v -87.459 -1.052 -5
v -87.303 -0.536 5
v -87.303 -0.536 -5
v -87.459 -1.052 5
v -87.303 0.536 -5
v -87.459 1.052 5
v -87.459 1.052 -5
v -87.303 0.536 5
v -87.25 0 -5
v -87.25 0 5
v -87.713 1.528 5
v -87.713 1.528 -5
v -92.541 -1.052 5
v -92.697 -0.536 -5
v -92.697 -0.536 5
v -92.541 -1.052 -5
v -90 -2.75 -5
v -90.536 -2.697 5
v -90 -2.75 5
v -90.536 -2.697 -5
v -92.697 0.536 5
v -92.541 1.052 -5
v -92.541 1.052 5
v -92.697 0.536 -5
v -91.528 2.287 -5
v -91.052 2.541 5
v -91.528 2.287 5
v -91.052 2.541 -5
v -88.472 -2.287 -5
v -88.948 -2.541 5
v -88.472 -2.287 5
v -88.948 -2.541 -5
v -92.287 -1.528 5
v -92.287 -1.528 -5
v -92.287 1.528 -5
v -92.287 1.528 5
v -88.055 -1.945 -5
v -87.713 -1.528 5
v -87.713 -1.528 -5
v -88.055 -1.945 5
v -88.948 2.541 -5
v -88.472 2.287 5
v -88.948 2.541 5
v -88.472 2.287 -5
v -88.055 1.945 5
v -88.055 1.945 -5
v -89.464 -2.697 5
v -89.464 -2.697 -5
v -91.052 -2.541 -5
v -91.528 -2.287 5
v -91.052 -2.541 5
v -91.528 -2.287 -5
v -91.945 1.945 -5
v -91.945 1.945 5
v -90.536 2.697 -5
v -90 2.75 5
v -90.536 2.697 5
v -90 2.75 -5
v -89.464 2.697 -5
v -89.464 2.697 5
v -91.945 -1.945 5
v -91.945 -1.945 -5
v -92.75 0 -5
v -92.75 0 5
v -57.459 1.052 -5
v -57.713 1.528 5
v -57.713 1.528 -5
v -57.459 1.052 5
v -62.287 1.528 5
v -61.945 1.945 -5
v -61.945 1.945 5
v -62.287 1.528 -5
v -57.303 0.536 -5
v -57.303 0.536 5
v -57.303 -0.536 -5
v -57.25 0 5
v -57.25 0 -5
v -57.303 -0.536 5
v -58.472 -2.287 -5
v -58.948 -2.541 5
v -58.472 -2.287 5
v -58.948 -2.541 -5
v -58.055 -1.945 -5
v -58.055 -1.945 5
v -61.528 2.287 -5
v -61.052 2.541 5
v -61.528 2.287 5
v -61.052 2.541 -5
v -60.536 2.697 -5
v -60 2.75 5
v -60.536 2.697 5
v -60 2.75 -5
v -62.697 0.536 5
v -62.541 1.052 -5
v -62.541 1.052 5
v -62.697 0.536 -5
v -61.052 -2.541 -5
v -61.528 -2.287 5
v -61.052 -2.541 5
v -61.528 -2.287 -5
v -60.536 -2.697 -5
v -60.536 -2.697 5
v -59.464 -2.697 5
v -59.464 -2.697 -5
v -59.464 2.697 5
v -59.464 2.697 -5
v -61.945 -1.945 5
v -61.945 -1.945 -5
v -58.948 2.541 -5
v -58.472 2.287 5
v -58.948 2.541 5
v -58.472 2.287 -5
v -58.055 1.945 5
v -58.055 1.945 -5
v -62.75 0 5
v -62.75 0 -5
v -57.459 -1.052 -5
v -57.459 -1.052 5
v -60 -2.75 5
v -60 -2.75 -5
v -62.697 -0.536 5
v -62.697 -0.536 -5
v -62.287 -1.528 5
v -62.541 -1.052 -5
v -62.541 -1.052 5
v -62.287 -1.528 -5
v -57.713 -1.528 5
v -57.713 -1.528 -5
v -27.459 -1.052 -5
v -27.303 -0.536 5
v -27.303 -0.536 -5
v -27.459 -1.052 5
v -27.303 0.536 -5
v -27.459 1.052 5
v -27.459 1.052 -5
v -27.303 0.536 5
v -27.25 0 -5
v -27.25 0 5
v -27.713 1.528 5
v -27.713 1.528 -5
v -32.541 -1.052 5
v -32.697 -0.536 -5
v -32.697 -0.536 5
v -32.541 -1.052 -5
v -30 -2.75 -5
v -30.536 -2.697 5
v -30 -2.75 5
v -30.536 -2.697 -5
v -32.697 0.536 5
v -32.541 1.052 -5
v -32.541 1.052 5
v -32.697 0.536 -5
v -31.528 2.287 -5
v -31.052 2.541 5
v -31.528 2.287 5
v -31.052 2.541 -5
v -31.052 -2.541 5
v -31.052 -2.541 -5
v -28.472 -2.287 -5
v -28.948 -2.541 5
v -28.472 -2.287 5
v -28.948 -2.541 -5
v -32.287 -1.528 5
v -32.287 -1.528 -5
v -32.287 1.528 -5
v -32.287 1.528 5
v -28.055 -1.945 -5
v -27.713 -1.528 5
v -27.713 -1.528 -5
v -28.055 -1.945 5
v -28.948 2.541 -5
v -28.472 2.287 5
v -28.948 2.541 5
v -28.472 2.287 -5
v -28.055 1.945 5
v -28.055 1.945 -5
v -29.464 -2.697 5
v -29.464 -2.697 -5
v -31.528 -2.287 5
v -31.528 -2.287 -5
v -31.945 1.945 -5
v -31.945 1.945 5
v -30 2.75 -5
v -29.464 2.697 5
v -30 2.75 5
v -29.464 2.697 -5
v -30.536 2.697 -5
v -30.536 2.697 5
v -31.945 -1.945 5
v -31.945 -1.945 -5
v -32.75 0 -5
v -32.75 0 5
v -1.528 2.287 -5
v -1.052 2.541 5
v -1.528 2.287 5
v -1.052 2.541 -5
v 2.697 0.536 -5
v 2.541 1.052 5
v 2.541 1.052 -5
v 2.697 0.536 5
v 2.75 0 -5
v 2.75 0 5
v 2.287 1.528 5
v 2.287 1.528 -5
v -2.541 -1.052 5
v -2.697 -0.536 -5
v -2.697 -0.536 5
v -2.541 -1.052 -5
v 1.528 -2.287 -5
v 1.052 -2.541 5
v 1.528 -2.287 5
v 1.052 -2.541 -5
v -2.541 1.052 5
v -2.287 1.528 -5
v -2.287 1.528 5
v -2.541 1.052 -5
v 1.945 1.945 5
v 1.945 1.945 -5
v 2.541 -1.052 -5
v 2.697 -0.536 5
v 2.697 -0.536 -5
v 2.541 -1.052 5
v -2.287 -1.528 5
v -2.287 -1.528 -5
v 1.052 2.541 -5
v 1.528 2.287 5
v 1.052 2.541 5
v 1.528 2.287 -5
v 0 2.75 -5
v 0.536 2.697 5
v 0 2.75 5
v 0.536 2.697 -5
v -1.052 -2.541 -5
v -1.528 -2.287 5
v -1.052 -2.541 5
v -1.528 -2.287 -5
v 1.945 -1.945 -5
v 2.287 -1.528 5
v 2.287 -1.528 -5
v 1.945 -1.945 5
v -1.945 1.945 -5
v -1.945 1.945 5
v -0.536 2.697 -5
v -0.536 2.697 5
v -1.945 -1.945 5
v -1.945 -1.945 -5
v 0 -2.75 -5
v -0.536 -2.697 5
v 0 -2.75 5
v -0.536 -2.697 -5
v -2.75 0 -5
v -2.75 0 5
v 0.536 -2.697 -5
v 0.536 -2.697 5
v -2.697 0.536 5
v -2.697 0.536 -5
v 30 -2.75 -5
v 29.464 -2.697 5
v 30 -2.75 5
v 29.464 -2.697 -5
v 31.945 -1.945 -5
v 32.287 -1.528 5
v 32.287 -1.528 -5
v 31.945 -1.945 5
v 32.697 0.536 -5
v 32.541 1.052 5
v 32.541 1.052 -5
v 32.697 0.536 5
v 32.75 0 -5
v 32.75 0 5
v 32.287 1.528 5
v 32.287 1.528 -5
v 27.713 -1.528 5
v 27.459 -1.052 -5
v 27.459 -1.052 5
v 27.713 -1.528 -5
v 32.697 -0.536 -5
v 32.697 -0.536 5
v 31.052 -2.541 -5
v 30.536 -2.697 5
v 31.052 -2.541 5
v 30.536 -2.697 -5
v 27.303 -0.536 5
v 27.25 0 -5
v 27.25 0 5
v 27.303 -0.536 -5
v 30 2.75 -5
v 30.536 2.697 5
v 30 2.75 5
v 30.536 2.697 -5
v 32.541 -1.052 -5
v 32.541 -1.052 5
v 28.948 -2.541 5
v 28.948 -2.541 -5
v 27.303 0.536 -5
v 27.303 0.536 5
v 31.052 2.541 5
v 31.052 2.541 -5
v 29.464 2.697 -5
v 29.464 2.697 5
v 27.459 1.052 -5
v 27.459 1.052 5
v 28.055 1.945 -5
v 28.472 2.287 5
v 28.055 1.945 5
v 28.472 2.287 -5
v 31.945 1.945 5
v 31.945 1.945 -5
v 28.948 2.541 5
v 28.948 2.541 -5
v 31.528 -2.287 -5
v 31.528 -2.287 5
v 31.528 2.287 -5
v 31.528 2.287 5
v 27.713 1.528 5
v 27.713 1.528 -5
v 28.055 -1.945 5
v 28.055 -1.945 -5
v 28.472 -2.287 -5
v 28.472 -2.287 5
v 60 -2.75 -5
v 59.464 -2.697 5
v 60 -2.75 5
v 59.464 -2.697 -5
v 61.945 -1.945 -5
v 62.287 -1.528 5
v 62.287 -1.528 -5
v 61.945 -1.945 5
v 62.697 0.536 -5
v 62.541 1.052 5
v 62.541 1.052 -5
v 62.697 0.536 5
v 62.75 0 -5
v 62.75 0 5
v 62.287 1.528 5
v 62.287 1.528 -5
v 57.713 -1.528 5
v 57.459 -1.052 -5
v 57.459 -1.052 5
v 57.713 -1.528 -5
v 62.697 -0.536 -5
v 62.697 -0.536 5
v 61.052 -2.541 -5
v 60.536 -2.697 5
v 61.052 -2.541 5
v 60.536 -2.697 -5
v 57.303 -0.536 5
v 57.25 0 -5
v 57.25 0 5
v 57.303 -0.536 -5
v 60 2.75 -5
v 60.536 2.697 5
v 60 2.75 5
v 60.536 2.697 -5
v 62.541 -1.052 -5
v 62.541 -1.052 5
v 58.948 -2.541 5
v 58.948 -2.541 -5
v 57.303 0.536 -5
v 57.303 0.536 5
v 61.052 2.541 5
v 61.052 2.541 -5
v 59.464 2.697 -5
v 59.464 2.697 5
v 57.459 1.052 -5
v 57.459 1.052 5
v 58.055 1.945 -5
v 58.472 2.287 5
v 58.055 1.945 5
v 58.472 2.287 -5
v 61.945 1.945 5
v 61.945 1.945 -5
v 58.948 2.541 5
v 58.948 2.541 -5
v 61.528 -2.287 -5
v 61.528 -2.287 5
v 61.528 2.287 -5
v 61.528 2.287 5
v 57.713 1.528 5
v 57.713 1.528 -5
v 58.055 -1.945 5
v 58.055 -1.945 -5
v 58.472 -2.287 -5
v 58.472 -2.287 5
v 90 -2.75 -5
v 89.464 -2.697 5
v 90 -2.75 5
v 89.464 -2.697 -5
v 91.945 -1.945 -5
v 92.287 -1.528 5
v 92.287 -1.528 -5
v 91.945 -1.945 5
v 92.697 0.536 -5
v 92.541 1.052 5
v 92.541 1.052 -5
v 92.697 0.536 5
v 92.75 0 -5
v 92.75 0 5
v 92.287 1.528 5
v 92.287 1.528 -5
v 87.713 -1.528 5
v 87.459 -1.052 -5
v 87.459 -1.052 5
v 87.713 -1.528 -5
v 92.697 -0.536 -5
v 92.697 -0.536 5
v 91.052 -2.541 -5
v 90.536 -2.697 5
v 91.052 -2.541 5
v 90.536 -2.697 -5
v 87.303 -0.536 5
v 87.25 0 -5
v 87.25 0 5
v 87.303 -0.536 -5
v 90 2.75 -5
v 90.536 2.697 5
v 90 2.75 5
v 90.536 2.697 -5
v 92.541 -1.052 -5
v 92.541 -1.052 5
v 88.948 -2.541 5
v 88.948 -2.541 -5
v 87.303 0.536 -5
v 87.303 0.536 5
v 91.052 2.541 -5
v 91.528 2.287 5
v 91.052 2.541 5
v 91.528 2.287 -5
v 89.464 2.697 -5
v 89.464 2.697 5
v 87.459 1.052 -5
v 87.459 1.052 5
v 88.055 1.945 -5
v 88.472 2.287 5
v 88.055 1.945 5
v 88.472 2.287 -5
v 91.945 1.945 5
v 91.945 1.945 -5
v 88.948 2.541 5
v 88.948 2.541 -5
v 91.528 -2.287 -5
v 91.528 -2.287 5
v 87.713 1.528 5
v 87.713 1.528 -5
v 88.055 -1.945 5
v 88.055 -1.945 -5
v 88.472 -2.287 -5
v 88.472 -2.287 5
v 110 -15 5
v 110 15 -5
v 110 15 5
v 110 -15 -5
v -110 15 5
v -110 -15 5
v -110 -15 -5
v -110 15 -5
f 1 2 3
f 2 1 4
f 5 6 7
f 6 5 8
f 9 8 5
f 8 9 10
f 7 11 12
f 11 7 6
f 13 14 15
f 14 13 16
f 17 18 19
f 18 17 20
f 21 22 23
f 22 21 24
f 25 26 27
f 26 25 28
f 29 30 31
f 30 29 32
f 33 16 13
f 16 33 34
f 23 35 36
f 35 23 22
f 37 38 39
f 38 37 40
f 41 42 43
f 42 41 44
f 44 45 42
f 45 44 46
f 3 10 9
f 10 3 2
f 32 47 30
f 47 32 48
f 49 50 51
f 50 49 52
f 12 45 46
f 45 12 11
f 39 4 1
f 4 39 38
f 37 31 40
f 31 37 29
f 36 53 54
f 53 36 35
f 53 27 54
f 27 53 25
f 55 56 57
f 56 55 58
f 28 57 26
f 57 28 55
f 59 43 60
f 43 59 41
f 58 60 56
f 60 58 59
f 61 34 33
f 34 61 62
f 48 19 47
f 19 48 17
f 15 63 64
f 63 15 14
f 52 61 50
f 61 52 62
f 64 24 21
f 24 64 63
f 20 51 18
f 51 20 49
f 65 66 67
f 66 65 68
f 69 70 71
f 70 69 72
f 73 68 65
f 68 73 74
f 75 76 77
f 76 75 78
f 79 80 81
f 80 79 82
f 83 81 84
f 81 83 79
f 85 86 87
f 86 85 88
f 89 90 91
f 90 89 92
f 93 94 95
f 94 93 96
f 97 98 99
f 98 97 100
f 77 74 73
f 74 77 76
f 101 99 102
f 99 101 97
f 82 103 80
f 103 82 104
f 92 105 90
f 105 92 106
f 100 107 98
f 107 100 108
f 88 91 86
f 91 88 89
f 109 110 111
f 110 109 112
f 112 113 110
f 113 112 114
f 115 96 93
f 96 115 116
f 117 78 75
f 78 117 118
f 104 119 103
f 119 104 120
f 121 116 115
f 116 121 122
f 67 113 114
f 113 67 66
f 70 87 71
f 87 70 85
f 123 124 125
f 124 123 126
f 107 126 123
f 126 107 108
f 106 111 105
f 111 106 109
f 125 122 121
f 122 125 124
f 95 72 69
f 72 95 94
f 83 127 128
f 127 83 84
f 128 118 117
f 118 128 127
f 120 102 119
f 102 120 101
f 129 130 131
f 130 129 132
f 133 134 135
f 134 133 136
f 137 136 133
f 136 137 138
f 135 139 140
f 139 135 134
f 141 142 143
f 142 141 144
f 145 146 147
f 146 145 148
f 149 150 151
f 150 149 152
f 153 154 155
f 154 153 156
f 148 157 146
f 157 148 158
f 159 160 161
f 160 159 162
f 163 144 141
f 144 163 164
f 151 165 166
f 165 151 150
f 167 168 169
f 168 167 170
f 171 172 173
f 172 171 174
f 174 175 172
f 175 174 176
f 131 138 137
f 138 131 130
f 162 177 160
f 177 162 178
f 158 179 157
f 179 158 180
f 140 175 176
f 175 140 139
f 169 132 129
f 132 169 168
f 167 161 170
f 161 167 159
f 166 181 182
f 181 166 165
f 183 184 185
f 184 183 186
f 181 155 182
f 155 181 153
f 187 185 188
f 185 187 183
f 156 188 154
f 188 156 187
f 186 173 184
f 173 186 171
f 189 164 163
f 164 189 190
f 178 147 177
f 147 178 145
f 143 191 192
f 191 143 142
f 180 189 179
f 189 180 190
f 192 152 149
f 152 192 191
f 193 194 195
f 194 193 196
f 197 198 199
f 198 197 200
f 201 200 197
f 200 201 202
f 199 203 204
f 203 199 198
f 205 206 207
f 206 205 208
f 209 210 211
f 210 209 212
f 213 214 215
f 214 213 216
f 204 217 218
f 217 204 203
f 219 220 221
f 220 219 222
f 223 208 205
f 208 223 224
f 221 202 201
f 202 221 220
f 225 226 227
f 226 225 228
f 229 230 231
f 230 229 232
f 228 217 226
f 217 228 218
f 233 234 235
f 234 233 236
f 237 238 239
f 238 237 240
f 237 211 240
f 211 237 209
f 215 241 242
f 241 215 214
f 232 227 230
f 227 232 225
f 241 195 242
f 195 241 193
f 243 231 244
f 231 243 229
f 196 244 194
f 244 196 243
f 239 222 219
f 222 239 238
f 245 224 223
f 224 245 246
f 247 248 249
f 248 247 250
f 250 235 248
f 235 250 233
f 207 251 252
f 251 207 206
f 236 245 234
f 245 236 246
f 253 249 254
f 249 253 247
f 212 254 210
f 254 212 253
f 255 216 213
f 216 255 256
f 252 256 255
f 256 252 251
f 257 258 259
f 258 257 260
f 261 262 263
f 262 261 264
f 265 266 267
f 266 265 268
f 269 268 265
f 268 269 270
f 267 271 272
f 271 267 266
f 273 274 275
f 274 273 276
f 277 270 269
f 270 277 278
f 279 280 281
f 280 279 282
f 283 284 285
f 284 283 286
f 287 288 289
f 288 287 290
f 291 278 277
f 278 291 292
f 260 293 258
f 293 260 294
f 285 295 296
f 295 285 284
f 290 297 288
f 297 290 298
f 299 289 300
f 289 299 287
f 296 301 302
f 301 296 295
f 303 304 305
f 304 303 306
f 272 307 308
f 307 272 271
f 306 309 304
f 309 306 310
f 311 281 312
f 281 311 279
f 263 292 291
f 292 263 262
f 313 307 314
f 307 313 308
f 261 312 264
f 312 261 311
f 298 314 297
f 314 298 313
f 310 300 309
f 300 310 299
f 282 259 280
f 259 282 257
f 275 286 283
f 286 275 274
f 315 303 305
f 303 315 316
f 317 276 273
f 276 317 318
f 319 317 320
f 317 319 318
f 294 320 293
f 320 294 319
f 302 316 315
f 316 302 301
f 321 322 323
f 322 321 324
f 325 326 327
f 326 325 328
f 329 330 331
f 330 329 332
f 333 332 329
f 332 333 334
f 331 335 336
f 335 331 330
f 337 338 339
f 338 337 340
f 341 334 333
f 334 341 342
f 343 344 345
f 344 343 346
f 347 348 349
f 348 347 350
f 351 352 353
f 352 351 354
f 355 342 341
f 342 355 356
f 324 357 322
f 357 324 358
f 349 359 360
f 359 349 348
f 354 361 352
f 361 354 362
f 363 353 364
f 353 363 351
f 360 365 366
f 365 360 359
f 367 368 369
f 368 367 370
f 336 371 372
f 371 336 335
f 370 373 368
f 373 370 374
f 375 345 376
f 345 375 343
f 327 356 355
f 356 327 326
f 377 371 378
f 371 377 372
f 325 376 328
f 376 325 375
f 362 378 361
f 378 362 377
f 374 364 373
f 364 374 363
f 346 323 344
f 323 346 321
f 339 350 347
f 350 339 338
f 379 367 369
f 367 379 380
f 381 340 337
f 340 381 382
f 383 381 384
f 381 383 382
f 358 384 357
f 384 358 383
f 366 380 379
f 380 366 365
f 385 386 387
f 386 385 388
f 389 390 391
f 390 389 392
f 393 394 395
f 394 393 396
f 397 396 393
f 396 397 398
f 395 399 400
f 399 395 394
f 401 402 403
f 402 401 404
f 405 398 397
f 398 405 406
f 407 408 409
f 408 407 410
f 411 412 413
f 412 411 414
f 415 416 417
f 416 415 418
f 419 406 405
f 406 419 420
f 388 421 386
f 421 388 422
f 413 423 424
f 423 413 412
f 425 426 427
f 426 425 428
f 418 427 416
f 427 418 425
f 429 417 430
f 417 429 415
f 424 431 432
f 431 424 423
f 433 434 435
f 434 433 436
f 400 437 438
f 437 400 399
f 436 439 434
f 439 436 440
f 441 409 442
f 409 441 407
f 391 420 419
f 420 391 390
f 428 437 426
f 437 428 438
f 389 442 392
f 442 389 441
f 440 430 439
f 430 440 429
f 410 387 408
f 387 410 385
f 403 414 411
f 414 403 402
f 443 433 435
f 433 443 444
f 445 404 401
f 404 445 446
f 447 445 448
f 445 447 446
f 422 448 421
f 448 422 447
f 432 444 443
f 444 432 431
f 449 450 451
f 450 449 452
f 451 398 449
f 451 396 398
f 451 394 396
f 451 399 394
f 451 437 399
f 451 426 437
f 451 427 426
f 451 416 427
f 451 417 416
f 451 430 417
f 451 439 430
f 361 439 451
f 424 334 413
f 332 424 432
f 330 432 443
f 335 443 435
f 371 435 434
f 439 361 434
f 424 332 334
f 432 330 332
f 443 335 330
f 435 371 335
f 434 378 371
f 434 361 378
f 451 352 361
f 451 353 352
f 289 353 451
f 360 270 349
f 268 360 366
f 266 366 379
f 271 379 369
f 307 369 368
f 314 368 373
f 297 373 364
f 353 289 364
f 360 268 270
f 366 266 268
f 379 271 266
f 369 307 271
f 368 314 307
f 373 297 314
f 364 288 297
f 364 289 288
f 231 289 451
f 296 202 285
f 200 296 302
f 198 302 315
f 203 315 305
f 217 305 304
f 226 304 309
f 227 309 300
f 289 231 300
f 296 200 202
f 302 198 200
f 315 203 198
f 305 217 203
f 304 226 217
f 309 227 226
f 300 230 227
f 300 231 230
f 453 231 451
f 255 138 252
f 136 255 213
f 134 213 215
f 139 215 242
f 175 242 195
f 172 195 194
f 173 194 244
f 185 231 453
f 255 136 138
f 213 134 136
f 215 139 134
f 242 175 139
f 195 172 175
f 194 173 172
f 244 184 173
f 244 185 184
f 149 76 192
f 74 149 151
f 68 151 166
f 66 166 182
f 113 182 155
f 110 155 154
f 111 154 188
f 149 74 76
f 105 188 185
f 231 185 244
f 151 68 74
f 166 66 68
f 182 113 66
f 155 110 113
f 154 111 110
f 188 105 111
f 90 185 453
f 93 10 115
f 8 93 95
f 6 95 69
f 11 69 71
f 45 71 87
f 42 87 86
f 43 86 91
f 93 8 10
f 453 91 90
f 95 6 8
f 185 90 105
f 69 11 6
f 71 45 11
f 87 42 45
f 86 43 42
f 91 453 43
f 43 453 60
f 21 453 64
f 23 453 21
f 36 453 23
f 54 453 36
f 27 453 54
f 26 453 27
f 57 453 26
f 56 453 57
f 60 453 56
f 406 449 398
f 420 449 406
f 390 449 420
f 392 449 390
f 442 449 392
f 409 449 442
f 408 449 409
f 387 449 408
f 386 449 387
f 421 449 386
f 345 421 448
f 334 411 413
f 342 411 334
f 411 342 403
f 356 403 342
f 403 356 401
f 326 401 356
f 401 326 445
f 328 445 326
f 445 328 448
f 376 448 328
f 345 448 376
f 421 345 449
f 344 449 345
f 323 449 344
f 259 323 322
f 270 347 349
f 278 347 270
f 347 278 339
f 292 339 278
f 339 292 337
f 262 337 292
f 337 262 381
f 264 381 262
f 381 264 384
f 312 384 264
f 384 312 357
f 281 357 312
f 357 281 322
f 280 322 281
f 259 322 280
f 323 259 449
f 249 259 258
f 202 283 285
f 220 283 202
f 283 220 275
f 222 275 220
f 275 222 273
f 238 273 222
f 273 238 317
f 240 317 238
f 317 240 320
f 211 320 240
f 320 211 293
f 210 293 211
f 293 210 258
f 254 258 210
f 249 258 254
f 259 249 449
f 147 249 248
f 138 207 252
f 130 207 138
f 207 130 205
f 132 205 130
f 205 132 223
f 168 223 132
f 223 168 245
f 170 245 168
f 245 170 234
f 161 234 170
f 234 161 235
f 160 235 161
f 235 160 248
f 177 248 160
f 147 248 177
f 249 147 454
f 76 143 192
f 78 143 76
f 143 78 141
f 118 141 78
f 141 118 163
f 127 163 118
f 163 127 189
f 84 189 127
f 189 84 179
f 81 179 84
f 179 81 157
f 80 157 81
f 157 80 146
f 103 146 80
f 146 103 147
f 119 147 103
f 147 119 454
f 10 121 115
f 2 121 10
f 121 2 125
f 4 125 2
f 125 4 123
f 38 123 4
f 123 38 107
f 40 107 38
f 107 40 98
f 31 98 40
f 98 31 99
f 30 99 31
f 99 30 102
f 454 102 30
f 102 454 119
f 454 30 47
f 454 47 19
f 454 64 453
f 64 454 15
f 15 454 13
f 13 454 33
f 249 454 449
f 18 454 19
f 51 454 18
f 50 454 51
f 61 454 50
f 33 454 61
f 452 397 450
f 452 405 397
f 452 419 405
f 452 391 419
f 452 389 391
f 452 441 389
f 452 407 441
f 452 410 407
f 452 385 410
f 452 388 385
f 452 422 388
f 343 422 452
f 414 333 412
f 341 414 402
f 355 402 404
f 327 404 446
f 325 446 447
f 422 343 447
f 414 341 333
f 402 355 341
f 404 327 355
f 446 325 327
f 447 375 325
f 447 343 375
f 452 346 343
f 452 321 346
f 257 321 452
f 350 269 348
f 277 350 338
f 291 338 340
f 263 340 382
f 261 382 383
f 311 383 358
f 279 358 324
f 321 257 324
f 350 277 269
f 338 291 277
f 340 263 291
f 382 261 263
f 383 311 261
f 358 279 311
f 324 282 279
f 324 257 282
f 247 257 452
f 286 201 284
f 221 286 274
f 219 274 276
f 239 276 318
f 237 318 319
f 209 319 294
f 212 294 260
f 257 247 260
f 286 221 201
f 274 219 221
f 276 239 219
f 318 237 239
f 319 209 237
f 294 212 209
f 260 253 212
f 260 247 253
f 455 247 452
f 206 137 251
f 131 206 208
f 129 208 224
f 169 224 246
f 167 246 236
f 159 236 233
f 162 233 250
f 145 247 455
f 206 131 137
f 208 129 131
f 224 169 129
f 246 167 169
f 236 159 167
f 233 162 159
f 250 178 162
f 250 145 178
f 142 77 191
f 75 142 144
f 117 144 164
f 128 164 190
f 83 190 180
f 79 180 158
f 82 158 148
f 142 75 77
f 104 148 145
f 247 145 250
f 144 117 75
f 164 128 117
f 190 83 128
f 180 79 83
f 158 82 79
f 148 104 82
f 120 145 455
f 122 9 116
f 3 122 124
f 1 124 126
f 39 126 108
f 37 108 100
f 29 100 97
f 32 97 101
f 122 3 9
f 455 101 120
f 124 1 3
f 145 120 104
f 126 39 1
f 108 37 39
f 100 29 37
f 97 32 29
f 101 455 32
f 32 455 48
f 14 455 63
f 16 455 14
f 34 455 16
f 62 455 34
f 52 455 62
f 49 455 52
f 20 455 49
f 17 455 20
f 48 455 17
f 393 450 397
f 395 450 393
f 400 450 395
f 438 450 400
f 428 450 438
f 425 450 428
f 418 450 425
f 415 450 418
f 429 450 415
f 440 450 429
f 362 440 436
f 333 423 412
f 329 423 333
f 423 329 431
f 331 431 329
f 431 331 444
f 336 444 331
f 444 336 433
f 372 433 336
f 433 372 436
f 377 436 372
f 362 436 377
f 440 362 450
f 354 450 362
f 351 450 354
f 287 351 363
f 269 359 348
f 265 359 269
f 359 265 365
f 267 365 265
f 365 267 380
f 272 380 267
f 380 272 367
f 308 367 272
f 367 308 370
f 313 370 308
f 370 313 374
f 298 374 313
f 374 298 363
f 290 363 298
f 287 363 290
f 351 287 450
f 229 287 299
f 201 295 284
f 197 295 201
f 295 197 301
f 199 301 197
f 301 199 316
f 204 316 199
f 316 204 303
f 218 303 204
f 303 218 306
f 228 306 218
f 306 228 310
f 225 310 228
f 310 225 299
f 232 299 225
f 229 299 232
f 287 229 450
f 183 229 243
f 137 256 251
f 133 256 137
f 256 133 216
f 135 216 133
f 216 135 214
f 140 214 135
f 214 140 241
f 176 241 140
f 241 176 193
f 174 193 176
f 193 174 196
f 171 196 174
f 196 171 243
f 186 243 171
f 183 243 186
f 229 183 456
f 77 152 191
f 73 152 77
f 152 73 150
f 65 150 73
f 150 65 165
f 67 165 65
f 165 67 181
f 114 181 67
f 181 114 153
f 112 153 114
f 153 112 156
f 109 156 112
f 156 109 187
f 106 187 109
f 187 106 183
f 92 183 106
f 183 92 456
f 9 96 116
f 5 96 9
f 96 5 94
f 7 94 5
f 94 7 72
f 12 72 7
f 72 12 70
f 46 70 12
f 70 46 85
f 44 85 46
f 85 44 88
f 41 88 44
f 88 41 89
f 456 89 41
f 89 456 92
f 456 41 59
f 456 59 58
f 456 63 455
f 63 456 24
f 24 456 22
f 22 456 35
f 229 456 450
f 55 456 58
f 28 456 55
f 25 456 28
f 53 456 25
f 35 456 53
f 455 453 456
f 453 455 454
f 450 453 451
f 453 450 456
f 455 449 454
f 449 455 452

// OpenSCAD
$fn = 32;

// ----------------------------------------------------------------------
// Hole bar, 7 x Ø5.5
// row layout, 20 mm edge offset
// ----------------------------------------------------------------------

// --- parameters (mm) ---
bar_w = 30;    // bar width (Y)
bar_t = 10;    // bar thickness (Z)
holes = 7;     // holes per row
hole_d = 5.5;  // hole diameter
edge = 20;     // offset from the bar end to the first hole
pitch = 30;    // pitch between neighbouring holes

// --- derived feature positions (mm) ---
span = (holes - 1) * pitch;   // = 180   distance between the end holes
bar_l = span + 2 * edge;      // = 220   overall bar length
start_x = -bar_l / 2 + edge;  // = -90   X of the first hole
feature_centers = [
  [start_x + 0 * pitch, 0],
  [start_x + 1 * pitch, 0],
  [start_x + 2 * pitch, 0],
  [start_x + 3 * pitch, 0],
  [start_x + 4 * pitch, 0],
  [start_x + 5 * pitch, 0],
  [start_x + 6 * pitch, 0]
];   // hole centres of the first row

// bar with one row of holes, drilled from feature_centers
difference() {
  translate([-bar_l / 2, -bar_w / 2, -bar_t / 2]) cube([bar_l, bar_w, bar_t]);
  for (centre = feature_centers)
    translate([centre[0], centre[1], 0])
      cylinder(d = hole_d, h = bar_t + 2, center = true);
}
